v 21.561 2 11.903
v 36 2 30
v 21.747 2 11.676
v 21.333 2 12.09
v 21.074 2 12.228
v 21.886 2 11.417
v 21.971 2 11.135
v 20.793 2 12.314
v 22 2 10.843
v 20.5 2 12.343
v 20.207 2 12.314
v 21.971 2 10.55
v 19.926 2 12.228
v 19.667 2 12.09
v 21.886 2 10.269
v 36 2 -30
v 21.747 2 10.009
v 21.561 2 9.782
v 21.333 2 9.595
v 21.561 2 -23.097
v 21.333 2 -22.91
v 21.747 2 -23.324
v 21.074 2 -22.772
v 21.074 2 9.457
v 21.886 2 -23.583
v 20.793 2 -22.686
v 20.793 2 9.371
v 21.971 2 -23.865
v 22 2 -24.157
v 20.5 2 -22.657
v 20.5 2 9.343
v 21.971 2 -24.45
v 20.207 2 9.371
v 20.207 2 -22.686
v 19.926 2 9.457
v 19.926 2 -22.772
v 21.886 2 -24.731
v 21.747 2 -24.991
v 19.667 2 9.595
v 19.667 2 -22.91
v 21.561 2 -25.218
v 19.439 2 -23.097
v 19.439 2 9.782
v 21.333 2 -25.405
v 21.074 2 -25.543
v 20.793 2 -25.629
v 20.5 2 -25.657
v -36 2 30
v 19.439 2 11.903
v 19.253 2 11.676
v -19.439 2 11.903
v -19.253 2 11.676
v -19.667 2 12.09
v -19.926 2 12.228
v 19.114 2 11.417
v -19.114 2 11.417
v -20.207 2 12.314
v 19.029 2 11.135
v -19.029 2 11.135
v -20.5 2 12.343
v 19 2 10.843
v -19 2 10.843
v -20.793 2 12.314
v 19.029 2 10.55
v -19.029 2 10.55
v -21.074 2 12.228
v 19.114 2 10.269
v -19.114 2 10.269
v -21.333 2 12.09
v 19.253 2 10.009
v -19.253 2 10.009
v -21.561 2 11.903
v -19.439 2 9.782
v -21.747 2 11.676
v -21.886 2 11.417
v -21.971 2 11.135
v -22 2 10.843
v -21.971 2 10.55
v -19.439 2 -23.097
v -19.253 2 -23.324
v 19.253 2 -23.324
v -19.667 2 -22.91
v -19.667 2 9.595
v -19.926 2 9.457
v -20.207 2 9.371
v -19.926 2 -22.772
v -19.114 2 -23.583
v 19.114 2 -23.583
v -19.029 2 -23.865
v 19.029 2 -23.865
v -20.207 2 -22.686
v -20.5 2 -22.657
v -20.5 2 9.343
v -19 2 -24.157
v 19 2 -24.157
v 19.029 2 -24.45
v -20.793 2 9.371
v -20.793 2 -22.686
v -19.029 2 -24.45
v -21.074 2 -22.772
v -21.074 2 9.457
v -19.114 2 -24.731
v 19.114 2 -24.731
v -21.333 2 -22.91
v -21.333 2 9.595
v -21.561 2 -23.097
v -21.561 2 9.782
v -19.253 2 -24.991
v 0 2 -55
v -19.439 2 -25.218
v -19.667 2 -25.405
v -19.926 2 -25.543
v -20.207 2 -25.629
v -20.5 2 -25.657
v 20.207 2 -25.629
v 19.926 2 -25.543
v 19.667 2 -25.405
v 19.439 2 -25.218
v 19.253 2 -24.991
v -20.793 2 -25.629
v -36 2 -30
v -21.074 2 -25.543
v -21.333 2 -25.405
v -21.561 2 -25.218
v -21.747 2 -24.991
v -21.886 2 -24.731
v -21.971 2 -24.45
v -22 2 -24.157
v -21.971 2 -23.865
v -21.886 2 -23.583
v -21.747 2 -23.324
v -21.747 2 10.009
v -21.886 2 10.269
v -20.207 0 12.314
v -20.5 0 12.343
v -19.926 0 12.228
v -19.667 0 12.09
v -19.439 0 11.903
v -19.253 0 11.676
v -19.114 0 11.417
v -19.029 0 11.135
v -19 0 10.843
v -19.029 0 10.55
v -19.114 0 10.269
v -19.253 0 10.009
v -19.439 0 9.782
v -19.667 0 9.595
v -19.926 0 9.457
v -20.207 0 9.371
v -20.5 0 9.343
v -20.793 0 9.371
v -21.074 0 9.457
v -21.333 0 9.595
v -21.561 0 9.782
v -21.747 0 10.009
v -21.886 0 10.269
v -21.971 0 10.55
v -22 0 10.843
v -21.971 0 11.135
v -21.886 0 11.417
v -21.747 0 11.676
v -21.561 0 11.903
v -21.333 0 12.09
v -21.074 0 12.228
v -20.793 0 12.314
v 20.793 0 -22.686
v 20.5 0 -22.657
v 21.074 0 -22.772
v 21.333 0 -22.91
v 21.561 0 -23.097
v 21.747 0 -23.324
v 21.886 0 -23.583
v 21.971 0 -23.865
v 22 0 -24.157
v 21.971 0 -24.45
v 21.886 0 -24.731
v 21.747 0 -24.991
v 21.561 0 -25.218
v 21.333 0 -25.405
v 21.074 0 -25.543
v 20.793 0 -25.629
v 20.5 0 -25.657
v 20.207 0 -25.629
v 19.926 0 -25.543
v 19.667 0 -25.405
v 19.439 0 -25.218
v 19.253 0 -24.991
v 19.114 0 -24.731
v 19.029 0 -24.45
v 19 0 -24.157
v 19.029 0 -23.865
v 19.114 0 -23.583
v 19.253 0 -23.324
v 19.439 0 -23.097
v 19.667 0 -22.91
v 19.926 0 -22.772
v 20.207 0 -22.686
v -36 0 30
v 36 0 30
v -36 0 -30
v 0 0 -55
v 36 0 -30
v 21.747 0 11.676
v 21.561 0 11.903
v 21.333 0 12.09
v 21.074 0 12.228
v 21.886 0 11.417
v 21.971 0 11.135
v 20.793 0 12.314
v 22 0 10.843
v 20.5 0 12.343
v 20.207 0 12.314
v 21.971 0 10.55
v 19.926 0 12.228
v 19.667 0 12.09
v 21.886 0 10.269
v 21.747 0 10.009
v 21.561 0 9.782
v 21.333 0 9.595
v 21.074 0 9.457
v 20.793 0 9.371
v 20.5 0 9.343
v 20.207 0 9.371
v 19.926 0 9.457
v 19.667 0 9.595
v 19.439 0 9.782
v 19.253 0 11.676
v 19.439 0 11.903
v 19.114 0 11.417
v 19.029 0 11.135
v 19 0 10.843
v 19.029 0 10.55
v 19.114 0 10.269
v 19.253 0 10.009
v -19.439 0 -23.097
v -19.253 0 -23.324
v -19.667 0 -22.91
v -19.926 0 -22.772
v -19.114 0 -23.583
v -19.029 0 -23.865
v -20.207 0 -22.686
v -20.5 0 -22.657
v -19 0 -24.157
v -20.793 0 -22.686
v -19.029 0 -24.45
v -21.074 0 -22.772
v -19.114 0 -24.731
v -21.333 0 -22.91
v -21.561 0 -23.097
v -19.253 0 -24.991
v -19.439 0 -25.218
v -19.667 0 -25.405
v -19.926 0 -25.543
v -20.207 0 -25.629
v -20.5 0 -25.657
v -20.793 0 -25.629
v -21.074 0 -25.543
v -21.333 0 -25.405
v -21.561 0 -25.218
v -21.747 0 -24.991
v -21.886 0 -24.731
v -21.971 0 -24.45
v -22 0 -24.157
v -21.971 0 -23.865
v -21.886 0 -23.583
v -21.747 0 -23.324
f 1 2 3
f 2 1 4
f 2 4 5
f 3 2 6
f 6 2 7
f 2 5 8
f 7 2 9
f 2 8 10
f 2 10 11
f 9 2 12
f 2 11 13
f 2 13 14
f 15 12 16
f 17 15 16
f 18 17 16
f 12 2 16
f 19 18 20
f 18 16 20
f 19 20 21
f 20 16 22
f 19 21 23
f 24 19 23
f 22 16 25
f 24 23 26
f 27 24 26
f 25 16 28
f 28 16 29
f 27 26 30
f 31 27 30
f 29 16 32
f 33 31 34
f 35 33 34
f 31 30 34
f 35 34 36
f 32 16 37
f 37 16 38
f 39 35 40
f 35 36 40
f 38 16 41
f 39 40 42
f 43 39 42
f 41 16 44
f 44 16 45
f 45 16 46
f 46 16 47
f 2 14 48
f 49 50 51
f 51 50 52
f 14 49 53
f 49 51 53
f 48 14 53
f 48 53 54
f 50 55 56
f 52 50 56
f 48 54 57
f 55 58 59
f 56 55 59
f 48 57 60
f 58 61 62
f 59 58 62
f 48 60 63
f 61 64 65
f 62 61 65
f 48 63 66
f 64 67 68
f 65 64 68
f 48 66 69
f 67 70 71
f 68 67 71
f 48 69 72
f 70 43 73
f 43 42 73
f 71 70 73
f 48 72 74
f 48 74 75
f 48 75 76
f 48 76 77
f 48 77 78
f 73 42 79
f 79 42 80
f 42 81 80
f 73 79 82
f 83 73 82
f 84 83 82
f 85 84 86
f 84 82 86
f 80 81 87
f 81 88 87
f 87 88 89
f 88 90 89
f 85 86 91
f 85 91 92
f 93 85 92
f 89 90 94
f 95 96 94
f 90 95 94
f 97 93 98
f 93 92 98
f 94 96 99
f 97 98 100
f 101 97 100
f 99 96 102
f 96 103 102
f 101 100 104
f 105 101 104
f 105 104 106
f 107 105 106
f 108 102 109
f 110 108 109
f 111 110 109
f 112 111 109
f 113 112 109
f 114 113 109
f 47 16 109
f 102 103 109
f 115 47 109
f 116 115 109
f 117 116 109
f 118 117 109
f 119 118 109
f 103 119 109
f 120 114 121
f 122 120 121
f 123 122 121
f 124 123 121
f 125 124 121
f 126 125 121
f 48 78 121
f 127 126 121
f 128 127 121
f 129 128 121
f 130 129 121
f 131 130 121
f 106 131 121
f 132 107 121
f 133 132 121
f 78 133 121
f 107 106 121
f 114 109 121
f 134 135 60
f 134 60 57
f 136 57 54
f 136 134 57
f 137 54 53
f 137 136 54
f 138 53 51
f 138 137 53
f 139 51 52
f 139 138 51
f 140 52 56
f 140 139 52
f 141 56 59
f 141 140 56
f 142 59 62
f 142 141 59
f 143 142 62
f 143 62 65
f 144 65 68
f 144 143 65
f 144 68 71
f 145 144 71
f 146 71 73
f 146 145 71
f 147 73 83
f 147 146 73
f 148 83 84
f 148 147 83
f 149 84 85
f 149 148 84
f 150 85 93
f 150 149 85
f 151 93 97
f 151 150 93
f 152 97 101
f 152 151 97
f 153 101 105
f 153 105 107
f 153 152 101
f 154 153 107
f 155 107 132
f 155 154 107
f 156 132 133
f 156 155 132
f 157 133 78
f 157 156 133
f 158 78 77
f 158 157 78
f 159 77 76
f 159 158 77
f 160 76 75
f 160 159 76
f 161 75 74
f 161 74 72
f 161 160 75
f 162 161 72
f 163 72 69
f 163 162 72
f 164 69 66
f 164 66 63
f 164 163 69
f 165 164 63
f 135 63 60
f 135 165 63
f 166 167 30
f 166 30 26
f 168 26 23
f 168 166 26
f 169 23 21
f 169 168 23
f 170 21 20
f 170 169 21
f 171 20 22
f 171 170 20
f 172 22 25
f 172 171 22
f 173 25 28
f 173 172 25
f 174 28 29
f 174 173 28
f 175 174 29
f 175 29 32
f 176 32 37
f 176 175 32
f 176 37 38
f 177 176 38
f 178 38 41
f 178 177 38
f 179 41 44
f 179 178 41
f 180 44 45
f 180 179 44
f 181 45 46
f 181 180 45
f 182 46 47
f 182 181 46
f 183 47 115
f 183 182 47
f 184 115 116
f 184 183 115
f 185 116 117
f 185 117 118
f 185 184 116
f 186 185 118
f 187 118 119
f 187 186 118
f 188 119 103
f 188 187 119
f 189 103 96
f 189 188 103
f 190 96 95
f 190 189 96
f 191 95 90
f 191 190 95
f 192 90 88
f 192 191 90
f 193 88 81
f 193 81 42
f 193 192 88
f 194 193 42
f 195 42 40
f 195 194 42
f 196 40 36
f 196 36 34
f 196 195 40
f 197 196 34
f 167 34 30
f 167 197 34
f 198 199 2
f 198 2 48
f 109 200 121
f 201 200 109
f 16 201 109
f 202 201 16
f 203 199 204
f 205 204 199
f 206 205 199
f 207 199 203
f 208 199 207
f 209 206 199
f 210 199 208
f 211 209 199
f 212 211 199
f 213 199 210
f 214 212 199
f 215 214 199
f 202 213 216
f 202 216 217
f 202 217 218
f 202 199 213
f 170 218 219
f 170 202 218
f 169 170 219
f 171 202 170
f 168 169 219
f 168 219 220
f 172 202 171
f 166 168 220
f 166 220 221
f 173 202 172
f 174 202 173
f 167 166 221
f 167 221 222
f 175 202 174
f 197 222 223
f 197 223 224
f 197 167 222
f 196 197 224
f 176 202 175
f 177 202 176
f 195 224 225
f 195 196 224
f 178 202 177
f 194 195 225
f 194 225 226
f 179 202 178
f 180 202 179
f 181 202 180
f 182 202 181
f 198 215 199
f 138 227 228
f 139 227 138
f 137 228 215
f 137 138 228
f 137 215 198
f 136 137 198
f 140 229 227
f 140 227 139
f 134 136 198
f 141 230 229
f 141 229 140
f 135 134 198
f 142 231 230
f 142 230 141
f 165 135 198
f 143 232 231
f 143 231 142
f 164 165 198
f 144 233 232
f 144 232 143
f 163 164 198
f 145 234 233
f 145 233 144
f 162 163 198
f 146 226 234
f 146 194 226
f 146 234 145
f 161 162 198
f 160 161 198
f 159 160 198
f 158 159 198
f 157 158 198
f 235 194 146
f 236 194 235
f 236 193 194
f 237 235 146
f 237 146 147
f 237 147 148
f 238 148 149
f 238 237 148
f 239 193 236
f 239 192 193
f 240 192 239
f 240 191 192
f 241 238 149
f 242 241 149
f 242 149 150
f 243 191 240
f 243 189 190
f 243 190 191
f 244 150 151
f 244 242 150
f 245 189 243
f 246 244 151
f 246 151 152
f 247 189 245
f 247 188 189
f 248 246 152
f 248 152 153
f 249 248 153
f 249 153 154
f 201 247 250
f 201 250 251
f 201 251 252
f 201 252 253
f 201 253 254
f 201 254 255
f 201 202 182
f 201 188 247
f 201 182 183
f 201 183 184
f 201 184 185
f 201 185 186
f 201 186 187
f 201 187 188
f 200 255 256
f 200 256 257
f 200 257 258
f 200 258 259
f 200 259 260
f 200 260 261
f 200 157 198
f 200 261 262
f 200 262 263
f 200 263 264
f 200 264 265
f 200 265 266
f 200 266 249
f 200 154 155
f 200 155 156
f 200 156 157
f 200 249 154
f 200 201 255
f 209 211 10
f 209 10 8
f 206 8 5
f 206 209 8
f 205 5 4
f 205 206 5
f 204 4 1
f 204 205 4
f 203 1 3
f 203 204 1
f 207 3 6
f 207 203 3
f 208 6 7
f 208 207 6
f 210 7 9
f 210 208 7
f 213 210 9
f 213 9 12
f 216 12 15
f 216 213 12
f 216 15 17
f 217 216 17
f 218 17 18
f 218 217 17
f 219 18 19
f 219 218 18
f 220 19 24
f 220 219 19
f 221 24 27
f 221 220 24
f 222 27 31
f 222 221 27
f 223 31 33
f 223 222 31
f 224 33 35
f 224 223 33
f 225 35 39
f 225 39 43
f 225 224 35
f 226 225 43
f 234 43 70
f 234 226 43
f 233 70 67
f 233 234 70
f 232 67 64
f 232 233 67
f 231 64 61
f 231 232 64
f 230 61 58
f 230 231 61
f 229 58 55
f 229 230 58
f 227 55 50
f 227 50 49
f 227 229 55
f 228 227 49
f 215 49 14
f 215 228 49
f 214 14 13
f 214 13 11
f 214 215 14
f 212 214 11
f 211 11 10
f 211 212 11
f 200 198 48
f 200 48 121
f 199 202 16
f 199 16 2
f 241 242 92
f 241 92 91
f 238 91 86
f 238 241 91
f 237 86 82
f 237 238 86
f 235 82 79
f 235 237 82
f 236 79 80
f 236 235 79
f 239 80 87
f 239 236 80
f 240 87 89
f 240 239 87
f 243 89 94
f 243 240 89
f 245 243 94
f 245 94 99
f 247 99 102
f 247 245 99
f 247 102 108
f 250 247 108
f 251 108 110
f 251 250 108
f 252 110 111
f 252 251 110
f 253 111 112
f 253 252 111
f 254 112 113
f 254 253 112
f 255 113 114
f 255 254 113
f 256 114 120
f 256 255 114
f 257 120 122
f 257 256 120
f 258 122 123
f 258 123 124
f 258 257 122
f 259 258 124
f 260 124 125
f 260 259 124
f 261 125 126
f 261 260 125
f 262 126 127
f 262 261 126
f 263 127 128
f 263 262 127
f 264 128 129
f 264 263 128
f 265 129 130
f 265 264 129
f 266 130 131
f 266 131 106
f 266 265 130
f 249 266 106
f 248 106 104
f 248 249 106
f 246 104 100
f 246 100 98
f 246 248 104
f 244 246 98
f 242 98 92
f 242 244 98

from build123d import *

# Parameters (mm, degrees)
SKETCH1_R           = 1.5
BOSS_EXTRUDE1_DEPTH = 2


with BuildPart() as part:
    # Sketch1 → Boss-Extrude1 (new body)
    with BuildSketch(Plane(origin=(0, 0, 0), x_dir=(1, 0, 0), z_dir=(0, 1, 0))):
        Polygon((-36, -30), (-36, 30), (0, 55), (36, 30), (36, -30), align=None)
        with Locations((-20.5, 24.157329938)):
            Circle(SKETCH1_R, mode=Mode.SUBTRACT)
        with Locations((20.5, 24.157329938)):
            Circle(SKETCH1_R, mode=Mode.SUBTRACT)
        with Locations((20.5, -10.842670062)):
            Circle(SKETCH1_R, mode=Mode.SUBTRACT)
        with Locations((-20.5, -10.842670062)):
            Circle(SKETCH1_R, mode=Mode.SUBTRACT)
    extrude(amount=BOSS_EXTRUDE1_DEPTH)


solid = part.part
